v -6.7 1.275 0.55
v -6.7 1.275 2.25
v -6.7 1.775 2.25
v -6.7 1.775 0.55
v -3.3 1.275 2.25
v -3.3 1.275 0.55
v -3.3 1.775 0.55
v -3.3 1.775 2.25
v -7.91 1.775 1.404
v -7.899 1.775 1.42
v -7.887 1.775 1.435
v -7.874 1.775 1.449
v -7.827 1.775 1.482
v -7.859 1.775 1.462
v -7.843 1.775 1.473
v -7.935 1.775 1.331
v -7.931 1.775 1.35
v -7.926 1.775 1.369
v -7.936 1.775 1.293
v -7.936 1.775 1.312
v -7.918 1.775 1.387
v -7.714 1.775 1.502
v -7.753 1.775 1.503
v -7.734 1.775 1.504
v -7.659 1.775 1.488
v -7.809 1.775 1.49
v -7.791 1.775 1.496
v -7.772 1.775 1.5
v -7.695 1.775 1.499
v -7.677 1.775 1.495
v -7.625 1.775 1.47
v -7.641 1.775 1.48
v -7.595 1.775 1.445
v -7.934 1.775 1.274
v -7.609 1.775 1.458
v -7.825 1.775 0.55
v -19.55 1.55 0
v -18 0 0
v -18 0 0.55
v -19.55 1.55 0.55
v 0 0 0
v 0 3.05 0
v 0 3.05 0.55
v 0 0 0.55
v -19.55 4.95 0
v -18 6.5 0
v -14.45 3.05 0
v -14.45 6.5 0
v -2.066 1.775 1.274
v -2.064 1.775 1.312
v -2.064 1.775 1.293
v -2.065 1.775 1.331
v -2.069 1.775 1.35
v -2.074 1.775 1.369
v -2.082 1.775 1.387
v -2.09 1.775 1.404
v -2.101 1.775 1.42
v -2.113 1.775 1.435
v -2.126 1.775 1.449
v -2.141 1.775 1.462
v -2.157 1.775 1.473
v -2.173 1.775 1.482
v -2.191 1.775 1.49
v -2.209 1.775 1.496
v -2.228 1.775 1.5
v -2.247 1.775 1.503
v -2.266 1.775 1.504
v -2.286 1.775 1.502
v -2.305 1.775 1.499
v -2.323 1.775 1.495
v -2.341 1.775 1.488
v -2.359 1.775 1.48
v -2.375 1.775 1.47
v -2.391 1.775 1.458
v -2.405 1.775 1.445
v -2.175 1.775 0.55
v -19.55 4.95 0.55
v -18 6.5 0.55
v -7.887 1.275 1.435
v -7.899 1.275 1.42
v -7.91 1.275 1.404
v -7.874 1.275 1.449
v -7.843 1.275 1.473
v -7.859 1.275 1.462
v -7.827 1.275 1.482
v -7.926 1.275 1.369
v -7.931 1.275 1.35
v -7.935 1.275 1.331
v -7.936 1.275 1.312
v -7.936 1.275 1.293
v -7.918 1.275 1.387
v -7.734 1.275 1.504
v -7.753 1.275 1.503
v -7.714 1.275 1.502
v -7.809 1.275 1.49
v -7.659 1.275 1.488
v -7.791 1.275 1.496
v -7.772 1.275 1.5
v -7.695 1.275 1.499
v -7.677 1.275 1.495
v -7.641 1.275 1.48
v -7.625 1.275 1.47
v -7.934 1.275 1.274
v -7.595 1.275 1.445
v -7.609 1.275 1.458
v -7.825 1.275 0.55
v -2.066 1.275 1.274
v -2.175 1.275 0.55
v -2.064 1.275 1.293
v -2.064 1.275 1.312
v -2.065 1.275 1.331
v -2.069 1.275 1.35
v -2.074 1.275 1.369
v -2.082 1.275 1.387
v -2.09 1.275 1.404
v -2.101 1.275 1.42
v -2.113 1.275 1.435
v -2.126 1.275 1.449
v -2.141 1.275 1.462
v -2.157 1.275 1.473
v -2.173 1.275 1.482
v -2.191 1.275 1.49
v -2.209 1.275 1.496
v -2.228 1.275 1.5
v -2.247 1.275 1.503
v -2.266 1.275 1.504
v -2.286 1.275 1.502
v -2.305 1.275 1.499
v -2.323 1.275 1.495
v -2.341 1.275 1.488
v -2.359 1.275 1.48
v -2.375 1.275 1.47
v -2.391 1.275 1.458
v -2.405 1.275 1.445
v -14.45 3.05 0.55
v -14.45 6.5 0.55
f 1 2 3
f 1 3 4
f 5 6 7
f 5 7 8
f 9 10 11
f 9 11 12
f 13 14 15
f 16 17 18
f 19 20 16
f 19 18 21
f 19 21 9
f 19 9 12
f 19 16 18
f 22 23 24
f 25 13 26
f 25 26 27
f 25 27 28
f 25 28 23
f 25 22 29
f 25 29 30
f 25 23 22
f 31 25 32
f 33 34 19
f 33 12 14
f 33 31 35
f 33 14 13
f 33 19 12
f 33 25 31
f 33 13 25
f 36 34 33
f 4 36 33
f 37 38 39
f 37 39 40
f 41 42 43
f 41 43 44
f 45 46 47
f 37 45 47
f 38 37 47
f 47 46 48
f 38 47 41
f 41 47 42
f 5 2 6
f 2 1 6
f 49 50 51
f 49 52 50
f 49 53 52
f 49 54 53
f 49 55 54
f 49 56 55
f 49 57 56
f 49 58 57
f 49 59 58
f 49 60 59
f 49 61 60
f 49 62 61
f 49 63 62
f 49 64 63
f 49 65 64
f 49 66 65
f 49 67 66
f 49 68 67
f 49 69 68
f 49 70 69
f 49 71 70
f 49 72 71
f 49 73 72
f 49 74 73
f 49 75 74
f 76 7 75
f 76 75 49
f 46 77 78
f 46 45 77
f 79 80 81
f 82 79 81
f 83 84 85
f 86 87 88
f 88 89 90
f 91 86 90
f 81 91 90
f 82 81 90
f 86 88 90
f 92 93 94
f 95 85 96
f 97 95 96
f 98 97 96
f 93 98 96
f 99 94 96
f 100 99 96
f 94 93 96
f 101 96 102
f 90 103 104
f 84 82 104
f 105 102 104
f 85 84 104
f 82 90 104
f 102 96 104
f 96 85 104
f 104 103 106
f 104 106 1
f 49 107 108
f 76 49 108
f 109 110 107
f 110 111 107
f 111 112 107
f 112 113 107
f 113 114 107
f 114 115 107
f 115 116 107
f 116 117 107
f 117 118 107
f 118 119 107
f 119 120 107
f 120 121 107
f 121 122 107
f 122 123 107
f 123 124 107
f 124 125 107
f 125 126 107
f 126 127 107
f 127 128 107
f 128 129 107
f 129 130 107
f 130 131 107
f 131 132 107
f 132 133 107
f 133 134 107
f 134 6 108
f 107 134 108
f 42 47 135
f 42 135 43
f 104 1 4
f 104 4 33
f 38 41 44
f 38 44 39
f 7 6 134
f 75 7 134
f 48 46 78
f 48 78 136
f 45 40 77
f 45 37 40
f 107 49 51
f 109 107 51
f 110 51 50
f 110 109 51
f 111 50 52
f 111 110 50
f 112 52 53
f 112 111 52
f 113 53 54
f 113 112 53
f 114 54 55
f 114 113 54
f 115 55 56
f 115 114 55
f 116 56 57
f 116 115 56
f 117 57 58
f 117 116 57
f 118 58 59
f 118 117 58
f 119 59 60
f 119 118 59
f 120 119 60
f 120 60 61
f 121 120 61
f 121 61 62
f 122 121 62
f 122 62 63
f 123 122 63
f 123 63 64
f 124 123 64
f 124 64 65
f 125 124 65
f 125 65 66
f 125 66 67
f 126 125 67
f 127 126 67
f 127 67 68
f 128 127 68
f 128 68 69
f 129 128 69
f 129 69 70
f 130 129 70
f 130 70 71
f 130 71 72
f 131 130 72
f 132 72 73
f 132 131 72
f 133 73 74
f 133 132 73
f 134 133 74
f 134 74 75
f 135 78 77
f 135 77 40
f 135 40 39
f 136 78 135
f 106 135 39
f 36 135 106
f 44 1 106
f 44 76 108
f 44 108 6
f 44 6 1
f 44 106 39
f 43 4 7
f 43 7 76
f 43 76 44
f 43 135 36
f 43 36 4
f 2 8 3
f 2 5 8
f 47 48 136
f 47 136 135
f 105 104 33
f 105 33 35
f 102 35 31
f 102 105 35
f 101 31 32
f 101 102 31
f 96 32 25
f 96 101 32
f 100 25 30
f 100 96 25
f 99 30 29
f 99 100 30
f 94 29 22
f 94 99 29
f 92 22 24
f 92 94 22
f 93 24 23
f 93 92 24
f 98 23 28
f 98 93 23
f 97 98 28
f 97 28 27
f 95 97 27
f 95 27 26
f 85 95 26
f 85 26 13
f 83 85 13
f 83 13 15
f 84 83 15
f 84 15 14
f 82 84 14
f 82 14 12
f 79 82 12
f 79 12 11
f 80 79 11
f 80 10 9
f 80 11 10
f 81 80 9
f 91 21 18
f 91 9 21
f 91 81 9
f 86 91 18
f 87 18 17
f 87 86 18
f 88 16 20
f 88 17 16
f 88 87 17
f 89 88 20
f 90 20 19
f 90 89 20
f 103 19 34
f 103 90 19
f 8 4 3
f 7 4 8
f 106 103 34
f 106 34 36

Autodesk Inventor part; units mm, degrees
ref_plane "YZ Plane" through (0, 0, 0) normal (1, 0, 0) x (0, 1, 0)
ref_plane "XZ Plane" through (0, 0, 0) normal (0, 1, 0) x (-1, 0, 0)
ref_plane "XY Plane" through (0, 0, 0) normal (0, 0, 1) x (1, 0, 0)
sketch "Sketch1" plane through (0, 0, 0) normal (0, 0, 1) x (1, 0, 0)
  line L0 (0, 0) -> (-18, 0)
  line L1 (-18, 0) -> (-19.55, 1.55)
  line L2 (-19.55, 1.55) -> (-19.55, 4.95)
  line L3 (-19.55, 4.95) -> (-18, 6.5)
  line L4 (-18, 6.5) -> (-14.45, 6.5)
  line L5 (-14.45, 6.5) -> (-14.45, 3.05)
  line L6 (-14.45, 3.05) -> (0, 3.05)
  line L7 (0, 3.05) -> (0, 0)
  point P0 (-19.55, 3.25)
  dimension "d0" = 3.05
  dimension "d1" = 14.45
  dimension "d2" = 6.5
  dimension "d3" = 5.1
  dimension "d4" = 3.4
  dimension "d5" = 3.25
  dimension "d6" = 3.55
extrude "Extrusion1" add sketch "Sketch1" along normal blind 0.55
ref_plane "Work Plane1" through (-14.45, 1.525, 0) normal (0, 1, 0) x (1, 0, 0)
sketch "Sketch2" plane through (-14.45, 1.525, 0) normal (0, 1, 0) x (1, 0, 0)
  line L0 (14.45, -0.55) -> (0, -0.55) projected
  line L1 (14.45, 0) -> (14.45, -0.55) projected
  line L2 (7.75, -0.55) -> (11.15, -0.55)
  line L3 (11.15, -0.55) -> (11.15, -2.25)
  line L4 (11.15, -2.25) -> (7.75, -2.25)
  line L5 (7.75, -2.25) -> (7.75, -0.55)
  line L6 (11.15, -0.55) -> (12.475, -1.875)
  line L7 (12.475, -1.875) -> (12.275, -0.55)
  line L8 (7.75, -0.55) -> (6.425, -1.875)
  line L9 (6.425, -1.875) -> (6.625, -0.55)
  line L10 (6.625, -0.55) -> (7.75, -0.55)
  line L11 (11.15, -0.55) -> (12.275, -0.55)
  point P0 (9.45, -2.25)
  dimension "d9" = 3.3
  dimension "d10" = 3.4
  dimension "d11" = 1.7
  dimension "d14" = 6.05
  dimension "d15" = 3.025
  dimension "d16" = 5.65
extrude "Extrusion2" add sketch "Sketch2" along normal mid plane 0.5
fillet "Fillet1" radius 0.2 2 edges at (-8.025, 1.525, 1.875) (-1.975, 1.525, 1.875)
equation "\"d5\" = 0.5 * d2"
equation "\"d15\" = 0.5 * d14"
properties part number "Soanar Power Module Pin E" material "Nickel-Copper Alloy 400"
